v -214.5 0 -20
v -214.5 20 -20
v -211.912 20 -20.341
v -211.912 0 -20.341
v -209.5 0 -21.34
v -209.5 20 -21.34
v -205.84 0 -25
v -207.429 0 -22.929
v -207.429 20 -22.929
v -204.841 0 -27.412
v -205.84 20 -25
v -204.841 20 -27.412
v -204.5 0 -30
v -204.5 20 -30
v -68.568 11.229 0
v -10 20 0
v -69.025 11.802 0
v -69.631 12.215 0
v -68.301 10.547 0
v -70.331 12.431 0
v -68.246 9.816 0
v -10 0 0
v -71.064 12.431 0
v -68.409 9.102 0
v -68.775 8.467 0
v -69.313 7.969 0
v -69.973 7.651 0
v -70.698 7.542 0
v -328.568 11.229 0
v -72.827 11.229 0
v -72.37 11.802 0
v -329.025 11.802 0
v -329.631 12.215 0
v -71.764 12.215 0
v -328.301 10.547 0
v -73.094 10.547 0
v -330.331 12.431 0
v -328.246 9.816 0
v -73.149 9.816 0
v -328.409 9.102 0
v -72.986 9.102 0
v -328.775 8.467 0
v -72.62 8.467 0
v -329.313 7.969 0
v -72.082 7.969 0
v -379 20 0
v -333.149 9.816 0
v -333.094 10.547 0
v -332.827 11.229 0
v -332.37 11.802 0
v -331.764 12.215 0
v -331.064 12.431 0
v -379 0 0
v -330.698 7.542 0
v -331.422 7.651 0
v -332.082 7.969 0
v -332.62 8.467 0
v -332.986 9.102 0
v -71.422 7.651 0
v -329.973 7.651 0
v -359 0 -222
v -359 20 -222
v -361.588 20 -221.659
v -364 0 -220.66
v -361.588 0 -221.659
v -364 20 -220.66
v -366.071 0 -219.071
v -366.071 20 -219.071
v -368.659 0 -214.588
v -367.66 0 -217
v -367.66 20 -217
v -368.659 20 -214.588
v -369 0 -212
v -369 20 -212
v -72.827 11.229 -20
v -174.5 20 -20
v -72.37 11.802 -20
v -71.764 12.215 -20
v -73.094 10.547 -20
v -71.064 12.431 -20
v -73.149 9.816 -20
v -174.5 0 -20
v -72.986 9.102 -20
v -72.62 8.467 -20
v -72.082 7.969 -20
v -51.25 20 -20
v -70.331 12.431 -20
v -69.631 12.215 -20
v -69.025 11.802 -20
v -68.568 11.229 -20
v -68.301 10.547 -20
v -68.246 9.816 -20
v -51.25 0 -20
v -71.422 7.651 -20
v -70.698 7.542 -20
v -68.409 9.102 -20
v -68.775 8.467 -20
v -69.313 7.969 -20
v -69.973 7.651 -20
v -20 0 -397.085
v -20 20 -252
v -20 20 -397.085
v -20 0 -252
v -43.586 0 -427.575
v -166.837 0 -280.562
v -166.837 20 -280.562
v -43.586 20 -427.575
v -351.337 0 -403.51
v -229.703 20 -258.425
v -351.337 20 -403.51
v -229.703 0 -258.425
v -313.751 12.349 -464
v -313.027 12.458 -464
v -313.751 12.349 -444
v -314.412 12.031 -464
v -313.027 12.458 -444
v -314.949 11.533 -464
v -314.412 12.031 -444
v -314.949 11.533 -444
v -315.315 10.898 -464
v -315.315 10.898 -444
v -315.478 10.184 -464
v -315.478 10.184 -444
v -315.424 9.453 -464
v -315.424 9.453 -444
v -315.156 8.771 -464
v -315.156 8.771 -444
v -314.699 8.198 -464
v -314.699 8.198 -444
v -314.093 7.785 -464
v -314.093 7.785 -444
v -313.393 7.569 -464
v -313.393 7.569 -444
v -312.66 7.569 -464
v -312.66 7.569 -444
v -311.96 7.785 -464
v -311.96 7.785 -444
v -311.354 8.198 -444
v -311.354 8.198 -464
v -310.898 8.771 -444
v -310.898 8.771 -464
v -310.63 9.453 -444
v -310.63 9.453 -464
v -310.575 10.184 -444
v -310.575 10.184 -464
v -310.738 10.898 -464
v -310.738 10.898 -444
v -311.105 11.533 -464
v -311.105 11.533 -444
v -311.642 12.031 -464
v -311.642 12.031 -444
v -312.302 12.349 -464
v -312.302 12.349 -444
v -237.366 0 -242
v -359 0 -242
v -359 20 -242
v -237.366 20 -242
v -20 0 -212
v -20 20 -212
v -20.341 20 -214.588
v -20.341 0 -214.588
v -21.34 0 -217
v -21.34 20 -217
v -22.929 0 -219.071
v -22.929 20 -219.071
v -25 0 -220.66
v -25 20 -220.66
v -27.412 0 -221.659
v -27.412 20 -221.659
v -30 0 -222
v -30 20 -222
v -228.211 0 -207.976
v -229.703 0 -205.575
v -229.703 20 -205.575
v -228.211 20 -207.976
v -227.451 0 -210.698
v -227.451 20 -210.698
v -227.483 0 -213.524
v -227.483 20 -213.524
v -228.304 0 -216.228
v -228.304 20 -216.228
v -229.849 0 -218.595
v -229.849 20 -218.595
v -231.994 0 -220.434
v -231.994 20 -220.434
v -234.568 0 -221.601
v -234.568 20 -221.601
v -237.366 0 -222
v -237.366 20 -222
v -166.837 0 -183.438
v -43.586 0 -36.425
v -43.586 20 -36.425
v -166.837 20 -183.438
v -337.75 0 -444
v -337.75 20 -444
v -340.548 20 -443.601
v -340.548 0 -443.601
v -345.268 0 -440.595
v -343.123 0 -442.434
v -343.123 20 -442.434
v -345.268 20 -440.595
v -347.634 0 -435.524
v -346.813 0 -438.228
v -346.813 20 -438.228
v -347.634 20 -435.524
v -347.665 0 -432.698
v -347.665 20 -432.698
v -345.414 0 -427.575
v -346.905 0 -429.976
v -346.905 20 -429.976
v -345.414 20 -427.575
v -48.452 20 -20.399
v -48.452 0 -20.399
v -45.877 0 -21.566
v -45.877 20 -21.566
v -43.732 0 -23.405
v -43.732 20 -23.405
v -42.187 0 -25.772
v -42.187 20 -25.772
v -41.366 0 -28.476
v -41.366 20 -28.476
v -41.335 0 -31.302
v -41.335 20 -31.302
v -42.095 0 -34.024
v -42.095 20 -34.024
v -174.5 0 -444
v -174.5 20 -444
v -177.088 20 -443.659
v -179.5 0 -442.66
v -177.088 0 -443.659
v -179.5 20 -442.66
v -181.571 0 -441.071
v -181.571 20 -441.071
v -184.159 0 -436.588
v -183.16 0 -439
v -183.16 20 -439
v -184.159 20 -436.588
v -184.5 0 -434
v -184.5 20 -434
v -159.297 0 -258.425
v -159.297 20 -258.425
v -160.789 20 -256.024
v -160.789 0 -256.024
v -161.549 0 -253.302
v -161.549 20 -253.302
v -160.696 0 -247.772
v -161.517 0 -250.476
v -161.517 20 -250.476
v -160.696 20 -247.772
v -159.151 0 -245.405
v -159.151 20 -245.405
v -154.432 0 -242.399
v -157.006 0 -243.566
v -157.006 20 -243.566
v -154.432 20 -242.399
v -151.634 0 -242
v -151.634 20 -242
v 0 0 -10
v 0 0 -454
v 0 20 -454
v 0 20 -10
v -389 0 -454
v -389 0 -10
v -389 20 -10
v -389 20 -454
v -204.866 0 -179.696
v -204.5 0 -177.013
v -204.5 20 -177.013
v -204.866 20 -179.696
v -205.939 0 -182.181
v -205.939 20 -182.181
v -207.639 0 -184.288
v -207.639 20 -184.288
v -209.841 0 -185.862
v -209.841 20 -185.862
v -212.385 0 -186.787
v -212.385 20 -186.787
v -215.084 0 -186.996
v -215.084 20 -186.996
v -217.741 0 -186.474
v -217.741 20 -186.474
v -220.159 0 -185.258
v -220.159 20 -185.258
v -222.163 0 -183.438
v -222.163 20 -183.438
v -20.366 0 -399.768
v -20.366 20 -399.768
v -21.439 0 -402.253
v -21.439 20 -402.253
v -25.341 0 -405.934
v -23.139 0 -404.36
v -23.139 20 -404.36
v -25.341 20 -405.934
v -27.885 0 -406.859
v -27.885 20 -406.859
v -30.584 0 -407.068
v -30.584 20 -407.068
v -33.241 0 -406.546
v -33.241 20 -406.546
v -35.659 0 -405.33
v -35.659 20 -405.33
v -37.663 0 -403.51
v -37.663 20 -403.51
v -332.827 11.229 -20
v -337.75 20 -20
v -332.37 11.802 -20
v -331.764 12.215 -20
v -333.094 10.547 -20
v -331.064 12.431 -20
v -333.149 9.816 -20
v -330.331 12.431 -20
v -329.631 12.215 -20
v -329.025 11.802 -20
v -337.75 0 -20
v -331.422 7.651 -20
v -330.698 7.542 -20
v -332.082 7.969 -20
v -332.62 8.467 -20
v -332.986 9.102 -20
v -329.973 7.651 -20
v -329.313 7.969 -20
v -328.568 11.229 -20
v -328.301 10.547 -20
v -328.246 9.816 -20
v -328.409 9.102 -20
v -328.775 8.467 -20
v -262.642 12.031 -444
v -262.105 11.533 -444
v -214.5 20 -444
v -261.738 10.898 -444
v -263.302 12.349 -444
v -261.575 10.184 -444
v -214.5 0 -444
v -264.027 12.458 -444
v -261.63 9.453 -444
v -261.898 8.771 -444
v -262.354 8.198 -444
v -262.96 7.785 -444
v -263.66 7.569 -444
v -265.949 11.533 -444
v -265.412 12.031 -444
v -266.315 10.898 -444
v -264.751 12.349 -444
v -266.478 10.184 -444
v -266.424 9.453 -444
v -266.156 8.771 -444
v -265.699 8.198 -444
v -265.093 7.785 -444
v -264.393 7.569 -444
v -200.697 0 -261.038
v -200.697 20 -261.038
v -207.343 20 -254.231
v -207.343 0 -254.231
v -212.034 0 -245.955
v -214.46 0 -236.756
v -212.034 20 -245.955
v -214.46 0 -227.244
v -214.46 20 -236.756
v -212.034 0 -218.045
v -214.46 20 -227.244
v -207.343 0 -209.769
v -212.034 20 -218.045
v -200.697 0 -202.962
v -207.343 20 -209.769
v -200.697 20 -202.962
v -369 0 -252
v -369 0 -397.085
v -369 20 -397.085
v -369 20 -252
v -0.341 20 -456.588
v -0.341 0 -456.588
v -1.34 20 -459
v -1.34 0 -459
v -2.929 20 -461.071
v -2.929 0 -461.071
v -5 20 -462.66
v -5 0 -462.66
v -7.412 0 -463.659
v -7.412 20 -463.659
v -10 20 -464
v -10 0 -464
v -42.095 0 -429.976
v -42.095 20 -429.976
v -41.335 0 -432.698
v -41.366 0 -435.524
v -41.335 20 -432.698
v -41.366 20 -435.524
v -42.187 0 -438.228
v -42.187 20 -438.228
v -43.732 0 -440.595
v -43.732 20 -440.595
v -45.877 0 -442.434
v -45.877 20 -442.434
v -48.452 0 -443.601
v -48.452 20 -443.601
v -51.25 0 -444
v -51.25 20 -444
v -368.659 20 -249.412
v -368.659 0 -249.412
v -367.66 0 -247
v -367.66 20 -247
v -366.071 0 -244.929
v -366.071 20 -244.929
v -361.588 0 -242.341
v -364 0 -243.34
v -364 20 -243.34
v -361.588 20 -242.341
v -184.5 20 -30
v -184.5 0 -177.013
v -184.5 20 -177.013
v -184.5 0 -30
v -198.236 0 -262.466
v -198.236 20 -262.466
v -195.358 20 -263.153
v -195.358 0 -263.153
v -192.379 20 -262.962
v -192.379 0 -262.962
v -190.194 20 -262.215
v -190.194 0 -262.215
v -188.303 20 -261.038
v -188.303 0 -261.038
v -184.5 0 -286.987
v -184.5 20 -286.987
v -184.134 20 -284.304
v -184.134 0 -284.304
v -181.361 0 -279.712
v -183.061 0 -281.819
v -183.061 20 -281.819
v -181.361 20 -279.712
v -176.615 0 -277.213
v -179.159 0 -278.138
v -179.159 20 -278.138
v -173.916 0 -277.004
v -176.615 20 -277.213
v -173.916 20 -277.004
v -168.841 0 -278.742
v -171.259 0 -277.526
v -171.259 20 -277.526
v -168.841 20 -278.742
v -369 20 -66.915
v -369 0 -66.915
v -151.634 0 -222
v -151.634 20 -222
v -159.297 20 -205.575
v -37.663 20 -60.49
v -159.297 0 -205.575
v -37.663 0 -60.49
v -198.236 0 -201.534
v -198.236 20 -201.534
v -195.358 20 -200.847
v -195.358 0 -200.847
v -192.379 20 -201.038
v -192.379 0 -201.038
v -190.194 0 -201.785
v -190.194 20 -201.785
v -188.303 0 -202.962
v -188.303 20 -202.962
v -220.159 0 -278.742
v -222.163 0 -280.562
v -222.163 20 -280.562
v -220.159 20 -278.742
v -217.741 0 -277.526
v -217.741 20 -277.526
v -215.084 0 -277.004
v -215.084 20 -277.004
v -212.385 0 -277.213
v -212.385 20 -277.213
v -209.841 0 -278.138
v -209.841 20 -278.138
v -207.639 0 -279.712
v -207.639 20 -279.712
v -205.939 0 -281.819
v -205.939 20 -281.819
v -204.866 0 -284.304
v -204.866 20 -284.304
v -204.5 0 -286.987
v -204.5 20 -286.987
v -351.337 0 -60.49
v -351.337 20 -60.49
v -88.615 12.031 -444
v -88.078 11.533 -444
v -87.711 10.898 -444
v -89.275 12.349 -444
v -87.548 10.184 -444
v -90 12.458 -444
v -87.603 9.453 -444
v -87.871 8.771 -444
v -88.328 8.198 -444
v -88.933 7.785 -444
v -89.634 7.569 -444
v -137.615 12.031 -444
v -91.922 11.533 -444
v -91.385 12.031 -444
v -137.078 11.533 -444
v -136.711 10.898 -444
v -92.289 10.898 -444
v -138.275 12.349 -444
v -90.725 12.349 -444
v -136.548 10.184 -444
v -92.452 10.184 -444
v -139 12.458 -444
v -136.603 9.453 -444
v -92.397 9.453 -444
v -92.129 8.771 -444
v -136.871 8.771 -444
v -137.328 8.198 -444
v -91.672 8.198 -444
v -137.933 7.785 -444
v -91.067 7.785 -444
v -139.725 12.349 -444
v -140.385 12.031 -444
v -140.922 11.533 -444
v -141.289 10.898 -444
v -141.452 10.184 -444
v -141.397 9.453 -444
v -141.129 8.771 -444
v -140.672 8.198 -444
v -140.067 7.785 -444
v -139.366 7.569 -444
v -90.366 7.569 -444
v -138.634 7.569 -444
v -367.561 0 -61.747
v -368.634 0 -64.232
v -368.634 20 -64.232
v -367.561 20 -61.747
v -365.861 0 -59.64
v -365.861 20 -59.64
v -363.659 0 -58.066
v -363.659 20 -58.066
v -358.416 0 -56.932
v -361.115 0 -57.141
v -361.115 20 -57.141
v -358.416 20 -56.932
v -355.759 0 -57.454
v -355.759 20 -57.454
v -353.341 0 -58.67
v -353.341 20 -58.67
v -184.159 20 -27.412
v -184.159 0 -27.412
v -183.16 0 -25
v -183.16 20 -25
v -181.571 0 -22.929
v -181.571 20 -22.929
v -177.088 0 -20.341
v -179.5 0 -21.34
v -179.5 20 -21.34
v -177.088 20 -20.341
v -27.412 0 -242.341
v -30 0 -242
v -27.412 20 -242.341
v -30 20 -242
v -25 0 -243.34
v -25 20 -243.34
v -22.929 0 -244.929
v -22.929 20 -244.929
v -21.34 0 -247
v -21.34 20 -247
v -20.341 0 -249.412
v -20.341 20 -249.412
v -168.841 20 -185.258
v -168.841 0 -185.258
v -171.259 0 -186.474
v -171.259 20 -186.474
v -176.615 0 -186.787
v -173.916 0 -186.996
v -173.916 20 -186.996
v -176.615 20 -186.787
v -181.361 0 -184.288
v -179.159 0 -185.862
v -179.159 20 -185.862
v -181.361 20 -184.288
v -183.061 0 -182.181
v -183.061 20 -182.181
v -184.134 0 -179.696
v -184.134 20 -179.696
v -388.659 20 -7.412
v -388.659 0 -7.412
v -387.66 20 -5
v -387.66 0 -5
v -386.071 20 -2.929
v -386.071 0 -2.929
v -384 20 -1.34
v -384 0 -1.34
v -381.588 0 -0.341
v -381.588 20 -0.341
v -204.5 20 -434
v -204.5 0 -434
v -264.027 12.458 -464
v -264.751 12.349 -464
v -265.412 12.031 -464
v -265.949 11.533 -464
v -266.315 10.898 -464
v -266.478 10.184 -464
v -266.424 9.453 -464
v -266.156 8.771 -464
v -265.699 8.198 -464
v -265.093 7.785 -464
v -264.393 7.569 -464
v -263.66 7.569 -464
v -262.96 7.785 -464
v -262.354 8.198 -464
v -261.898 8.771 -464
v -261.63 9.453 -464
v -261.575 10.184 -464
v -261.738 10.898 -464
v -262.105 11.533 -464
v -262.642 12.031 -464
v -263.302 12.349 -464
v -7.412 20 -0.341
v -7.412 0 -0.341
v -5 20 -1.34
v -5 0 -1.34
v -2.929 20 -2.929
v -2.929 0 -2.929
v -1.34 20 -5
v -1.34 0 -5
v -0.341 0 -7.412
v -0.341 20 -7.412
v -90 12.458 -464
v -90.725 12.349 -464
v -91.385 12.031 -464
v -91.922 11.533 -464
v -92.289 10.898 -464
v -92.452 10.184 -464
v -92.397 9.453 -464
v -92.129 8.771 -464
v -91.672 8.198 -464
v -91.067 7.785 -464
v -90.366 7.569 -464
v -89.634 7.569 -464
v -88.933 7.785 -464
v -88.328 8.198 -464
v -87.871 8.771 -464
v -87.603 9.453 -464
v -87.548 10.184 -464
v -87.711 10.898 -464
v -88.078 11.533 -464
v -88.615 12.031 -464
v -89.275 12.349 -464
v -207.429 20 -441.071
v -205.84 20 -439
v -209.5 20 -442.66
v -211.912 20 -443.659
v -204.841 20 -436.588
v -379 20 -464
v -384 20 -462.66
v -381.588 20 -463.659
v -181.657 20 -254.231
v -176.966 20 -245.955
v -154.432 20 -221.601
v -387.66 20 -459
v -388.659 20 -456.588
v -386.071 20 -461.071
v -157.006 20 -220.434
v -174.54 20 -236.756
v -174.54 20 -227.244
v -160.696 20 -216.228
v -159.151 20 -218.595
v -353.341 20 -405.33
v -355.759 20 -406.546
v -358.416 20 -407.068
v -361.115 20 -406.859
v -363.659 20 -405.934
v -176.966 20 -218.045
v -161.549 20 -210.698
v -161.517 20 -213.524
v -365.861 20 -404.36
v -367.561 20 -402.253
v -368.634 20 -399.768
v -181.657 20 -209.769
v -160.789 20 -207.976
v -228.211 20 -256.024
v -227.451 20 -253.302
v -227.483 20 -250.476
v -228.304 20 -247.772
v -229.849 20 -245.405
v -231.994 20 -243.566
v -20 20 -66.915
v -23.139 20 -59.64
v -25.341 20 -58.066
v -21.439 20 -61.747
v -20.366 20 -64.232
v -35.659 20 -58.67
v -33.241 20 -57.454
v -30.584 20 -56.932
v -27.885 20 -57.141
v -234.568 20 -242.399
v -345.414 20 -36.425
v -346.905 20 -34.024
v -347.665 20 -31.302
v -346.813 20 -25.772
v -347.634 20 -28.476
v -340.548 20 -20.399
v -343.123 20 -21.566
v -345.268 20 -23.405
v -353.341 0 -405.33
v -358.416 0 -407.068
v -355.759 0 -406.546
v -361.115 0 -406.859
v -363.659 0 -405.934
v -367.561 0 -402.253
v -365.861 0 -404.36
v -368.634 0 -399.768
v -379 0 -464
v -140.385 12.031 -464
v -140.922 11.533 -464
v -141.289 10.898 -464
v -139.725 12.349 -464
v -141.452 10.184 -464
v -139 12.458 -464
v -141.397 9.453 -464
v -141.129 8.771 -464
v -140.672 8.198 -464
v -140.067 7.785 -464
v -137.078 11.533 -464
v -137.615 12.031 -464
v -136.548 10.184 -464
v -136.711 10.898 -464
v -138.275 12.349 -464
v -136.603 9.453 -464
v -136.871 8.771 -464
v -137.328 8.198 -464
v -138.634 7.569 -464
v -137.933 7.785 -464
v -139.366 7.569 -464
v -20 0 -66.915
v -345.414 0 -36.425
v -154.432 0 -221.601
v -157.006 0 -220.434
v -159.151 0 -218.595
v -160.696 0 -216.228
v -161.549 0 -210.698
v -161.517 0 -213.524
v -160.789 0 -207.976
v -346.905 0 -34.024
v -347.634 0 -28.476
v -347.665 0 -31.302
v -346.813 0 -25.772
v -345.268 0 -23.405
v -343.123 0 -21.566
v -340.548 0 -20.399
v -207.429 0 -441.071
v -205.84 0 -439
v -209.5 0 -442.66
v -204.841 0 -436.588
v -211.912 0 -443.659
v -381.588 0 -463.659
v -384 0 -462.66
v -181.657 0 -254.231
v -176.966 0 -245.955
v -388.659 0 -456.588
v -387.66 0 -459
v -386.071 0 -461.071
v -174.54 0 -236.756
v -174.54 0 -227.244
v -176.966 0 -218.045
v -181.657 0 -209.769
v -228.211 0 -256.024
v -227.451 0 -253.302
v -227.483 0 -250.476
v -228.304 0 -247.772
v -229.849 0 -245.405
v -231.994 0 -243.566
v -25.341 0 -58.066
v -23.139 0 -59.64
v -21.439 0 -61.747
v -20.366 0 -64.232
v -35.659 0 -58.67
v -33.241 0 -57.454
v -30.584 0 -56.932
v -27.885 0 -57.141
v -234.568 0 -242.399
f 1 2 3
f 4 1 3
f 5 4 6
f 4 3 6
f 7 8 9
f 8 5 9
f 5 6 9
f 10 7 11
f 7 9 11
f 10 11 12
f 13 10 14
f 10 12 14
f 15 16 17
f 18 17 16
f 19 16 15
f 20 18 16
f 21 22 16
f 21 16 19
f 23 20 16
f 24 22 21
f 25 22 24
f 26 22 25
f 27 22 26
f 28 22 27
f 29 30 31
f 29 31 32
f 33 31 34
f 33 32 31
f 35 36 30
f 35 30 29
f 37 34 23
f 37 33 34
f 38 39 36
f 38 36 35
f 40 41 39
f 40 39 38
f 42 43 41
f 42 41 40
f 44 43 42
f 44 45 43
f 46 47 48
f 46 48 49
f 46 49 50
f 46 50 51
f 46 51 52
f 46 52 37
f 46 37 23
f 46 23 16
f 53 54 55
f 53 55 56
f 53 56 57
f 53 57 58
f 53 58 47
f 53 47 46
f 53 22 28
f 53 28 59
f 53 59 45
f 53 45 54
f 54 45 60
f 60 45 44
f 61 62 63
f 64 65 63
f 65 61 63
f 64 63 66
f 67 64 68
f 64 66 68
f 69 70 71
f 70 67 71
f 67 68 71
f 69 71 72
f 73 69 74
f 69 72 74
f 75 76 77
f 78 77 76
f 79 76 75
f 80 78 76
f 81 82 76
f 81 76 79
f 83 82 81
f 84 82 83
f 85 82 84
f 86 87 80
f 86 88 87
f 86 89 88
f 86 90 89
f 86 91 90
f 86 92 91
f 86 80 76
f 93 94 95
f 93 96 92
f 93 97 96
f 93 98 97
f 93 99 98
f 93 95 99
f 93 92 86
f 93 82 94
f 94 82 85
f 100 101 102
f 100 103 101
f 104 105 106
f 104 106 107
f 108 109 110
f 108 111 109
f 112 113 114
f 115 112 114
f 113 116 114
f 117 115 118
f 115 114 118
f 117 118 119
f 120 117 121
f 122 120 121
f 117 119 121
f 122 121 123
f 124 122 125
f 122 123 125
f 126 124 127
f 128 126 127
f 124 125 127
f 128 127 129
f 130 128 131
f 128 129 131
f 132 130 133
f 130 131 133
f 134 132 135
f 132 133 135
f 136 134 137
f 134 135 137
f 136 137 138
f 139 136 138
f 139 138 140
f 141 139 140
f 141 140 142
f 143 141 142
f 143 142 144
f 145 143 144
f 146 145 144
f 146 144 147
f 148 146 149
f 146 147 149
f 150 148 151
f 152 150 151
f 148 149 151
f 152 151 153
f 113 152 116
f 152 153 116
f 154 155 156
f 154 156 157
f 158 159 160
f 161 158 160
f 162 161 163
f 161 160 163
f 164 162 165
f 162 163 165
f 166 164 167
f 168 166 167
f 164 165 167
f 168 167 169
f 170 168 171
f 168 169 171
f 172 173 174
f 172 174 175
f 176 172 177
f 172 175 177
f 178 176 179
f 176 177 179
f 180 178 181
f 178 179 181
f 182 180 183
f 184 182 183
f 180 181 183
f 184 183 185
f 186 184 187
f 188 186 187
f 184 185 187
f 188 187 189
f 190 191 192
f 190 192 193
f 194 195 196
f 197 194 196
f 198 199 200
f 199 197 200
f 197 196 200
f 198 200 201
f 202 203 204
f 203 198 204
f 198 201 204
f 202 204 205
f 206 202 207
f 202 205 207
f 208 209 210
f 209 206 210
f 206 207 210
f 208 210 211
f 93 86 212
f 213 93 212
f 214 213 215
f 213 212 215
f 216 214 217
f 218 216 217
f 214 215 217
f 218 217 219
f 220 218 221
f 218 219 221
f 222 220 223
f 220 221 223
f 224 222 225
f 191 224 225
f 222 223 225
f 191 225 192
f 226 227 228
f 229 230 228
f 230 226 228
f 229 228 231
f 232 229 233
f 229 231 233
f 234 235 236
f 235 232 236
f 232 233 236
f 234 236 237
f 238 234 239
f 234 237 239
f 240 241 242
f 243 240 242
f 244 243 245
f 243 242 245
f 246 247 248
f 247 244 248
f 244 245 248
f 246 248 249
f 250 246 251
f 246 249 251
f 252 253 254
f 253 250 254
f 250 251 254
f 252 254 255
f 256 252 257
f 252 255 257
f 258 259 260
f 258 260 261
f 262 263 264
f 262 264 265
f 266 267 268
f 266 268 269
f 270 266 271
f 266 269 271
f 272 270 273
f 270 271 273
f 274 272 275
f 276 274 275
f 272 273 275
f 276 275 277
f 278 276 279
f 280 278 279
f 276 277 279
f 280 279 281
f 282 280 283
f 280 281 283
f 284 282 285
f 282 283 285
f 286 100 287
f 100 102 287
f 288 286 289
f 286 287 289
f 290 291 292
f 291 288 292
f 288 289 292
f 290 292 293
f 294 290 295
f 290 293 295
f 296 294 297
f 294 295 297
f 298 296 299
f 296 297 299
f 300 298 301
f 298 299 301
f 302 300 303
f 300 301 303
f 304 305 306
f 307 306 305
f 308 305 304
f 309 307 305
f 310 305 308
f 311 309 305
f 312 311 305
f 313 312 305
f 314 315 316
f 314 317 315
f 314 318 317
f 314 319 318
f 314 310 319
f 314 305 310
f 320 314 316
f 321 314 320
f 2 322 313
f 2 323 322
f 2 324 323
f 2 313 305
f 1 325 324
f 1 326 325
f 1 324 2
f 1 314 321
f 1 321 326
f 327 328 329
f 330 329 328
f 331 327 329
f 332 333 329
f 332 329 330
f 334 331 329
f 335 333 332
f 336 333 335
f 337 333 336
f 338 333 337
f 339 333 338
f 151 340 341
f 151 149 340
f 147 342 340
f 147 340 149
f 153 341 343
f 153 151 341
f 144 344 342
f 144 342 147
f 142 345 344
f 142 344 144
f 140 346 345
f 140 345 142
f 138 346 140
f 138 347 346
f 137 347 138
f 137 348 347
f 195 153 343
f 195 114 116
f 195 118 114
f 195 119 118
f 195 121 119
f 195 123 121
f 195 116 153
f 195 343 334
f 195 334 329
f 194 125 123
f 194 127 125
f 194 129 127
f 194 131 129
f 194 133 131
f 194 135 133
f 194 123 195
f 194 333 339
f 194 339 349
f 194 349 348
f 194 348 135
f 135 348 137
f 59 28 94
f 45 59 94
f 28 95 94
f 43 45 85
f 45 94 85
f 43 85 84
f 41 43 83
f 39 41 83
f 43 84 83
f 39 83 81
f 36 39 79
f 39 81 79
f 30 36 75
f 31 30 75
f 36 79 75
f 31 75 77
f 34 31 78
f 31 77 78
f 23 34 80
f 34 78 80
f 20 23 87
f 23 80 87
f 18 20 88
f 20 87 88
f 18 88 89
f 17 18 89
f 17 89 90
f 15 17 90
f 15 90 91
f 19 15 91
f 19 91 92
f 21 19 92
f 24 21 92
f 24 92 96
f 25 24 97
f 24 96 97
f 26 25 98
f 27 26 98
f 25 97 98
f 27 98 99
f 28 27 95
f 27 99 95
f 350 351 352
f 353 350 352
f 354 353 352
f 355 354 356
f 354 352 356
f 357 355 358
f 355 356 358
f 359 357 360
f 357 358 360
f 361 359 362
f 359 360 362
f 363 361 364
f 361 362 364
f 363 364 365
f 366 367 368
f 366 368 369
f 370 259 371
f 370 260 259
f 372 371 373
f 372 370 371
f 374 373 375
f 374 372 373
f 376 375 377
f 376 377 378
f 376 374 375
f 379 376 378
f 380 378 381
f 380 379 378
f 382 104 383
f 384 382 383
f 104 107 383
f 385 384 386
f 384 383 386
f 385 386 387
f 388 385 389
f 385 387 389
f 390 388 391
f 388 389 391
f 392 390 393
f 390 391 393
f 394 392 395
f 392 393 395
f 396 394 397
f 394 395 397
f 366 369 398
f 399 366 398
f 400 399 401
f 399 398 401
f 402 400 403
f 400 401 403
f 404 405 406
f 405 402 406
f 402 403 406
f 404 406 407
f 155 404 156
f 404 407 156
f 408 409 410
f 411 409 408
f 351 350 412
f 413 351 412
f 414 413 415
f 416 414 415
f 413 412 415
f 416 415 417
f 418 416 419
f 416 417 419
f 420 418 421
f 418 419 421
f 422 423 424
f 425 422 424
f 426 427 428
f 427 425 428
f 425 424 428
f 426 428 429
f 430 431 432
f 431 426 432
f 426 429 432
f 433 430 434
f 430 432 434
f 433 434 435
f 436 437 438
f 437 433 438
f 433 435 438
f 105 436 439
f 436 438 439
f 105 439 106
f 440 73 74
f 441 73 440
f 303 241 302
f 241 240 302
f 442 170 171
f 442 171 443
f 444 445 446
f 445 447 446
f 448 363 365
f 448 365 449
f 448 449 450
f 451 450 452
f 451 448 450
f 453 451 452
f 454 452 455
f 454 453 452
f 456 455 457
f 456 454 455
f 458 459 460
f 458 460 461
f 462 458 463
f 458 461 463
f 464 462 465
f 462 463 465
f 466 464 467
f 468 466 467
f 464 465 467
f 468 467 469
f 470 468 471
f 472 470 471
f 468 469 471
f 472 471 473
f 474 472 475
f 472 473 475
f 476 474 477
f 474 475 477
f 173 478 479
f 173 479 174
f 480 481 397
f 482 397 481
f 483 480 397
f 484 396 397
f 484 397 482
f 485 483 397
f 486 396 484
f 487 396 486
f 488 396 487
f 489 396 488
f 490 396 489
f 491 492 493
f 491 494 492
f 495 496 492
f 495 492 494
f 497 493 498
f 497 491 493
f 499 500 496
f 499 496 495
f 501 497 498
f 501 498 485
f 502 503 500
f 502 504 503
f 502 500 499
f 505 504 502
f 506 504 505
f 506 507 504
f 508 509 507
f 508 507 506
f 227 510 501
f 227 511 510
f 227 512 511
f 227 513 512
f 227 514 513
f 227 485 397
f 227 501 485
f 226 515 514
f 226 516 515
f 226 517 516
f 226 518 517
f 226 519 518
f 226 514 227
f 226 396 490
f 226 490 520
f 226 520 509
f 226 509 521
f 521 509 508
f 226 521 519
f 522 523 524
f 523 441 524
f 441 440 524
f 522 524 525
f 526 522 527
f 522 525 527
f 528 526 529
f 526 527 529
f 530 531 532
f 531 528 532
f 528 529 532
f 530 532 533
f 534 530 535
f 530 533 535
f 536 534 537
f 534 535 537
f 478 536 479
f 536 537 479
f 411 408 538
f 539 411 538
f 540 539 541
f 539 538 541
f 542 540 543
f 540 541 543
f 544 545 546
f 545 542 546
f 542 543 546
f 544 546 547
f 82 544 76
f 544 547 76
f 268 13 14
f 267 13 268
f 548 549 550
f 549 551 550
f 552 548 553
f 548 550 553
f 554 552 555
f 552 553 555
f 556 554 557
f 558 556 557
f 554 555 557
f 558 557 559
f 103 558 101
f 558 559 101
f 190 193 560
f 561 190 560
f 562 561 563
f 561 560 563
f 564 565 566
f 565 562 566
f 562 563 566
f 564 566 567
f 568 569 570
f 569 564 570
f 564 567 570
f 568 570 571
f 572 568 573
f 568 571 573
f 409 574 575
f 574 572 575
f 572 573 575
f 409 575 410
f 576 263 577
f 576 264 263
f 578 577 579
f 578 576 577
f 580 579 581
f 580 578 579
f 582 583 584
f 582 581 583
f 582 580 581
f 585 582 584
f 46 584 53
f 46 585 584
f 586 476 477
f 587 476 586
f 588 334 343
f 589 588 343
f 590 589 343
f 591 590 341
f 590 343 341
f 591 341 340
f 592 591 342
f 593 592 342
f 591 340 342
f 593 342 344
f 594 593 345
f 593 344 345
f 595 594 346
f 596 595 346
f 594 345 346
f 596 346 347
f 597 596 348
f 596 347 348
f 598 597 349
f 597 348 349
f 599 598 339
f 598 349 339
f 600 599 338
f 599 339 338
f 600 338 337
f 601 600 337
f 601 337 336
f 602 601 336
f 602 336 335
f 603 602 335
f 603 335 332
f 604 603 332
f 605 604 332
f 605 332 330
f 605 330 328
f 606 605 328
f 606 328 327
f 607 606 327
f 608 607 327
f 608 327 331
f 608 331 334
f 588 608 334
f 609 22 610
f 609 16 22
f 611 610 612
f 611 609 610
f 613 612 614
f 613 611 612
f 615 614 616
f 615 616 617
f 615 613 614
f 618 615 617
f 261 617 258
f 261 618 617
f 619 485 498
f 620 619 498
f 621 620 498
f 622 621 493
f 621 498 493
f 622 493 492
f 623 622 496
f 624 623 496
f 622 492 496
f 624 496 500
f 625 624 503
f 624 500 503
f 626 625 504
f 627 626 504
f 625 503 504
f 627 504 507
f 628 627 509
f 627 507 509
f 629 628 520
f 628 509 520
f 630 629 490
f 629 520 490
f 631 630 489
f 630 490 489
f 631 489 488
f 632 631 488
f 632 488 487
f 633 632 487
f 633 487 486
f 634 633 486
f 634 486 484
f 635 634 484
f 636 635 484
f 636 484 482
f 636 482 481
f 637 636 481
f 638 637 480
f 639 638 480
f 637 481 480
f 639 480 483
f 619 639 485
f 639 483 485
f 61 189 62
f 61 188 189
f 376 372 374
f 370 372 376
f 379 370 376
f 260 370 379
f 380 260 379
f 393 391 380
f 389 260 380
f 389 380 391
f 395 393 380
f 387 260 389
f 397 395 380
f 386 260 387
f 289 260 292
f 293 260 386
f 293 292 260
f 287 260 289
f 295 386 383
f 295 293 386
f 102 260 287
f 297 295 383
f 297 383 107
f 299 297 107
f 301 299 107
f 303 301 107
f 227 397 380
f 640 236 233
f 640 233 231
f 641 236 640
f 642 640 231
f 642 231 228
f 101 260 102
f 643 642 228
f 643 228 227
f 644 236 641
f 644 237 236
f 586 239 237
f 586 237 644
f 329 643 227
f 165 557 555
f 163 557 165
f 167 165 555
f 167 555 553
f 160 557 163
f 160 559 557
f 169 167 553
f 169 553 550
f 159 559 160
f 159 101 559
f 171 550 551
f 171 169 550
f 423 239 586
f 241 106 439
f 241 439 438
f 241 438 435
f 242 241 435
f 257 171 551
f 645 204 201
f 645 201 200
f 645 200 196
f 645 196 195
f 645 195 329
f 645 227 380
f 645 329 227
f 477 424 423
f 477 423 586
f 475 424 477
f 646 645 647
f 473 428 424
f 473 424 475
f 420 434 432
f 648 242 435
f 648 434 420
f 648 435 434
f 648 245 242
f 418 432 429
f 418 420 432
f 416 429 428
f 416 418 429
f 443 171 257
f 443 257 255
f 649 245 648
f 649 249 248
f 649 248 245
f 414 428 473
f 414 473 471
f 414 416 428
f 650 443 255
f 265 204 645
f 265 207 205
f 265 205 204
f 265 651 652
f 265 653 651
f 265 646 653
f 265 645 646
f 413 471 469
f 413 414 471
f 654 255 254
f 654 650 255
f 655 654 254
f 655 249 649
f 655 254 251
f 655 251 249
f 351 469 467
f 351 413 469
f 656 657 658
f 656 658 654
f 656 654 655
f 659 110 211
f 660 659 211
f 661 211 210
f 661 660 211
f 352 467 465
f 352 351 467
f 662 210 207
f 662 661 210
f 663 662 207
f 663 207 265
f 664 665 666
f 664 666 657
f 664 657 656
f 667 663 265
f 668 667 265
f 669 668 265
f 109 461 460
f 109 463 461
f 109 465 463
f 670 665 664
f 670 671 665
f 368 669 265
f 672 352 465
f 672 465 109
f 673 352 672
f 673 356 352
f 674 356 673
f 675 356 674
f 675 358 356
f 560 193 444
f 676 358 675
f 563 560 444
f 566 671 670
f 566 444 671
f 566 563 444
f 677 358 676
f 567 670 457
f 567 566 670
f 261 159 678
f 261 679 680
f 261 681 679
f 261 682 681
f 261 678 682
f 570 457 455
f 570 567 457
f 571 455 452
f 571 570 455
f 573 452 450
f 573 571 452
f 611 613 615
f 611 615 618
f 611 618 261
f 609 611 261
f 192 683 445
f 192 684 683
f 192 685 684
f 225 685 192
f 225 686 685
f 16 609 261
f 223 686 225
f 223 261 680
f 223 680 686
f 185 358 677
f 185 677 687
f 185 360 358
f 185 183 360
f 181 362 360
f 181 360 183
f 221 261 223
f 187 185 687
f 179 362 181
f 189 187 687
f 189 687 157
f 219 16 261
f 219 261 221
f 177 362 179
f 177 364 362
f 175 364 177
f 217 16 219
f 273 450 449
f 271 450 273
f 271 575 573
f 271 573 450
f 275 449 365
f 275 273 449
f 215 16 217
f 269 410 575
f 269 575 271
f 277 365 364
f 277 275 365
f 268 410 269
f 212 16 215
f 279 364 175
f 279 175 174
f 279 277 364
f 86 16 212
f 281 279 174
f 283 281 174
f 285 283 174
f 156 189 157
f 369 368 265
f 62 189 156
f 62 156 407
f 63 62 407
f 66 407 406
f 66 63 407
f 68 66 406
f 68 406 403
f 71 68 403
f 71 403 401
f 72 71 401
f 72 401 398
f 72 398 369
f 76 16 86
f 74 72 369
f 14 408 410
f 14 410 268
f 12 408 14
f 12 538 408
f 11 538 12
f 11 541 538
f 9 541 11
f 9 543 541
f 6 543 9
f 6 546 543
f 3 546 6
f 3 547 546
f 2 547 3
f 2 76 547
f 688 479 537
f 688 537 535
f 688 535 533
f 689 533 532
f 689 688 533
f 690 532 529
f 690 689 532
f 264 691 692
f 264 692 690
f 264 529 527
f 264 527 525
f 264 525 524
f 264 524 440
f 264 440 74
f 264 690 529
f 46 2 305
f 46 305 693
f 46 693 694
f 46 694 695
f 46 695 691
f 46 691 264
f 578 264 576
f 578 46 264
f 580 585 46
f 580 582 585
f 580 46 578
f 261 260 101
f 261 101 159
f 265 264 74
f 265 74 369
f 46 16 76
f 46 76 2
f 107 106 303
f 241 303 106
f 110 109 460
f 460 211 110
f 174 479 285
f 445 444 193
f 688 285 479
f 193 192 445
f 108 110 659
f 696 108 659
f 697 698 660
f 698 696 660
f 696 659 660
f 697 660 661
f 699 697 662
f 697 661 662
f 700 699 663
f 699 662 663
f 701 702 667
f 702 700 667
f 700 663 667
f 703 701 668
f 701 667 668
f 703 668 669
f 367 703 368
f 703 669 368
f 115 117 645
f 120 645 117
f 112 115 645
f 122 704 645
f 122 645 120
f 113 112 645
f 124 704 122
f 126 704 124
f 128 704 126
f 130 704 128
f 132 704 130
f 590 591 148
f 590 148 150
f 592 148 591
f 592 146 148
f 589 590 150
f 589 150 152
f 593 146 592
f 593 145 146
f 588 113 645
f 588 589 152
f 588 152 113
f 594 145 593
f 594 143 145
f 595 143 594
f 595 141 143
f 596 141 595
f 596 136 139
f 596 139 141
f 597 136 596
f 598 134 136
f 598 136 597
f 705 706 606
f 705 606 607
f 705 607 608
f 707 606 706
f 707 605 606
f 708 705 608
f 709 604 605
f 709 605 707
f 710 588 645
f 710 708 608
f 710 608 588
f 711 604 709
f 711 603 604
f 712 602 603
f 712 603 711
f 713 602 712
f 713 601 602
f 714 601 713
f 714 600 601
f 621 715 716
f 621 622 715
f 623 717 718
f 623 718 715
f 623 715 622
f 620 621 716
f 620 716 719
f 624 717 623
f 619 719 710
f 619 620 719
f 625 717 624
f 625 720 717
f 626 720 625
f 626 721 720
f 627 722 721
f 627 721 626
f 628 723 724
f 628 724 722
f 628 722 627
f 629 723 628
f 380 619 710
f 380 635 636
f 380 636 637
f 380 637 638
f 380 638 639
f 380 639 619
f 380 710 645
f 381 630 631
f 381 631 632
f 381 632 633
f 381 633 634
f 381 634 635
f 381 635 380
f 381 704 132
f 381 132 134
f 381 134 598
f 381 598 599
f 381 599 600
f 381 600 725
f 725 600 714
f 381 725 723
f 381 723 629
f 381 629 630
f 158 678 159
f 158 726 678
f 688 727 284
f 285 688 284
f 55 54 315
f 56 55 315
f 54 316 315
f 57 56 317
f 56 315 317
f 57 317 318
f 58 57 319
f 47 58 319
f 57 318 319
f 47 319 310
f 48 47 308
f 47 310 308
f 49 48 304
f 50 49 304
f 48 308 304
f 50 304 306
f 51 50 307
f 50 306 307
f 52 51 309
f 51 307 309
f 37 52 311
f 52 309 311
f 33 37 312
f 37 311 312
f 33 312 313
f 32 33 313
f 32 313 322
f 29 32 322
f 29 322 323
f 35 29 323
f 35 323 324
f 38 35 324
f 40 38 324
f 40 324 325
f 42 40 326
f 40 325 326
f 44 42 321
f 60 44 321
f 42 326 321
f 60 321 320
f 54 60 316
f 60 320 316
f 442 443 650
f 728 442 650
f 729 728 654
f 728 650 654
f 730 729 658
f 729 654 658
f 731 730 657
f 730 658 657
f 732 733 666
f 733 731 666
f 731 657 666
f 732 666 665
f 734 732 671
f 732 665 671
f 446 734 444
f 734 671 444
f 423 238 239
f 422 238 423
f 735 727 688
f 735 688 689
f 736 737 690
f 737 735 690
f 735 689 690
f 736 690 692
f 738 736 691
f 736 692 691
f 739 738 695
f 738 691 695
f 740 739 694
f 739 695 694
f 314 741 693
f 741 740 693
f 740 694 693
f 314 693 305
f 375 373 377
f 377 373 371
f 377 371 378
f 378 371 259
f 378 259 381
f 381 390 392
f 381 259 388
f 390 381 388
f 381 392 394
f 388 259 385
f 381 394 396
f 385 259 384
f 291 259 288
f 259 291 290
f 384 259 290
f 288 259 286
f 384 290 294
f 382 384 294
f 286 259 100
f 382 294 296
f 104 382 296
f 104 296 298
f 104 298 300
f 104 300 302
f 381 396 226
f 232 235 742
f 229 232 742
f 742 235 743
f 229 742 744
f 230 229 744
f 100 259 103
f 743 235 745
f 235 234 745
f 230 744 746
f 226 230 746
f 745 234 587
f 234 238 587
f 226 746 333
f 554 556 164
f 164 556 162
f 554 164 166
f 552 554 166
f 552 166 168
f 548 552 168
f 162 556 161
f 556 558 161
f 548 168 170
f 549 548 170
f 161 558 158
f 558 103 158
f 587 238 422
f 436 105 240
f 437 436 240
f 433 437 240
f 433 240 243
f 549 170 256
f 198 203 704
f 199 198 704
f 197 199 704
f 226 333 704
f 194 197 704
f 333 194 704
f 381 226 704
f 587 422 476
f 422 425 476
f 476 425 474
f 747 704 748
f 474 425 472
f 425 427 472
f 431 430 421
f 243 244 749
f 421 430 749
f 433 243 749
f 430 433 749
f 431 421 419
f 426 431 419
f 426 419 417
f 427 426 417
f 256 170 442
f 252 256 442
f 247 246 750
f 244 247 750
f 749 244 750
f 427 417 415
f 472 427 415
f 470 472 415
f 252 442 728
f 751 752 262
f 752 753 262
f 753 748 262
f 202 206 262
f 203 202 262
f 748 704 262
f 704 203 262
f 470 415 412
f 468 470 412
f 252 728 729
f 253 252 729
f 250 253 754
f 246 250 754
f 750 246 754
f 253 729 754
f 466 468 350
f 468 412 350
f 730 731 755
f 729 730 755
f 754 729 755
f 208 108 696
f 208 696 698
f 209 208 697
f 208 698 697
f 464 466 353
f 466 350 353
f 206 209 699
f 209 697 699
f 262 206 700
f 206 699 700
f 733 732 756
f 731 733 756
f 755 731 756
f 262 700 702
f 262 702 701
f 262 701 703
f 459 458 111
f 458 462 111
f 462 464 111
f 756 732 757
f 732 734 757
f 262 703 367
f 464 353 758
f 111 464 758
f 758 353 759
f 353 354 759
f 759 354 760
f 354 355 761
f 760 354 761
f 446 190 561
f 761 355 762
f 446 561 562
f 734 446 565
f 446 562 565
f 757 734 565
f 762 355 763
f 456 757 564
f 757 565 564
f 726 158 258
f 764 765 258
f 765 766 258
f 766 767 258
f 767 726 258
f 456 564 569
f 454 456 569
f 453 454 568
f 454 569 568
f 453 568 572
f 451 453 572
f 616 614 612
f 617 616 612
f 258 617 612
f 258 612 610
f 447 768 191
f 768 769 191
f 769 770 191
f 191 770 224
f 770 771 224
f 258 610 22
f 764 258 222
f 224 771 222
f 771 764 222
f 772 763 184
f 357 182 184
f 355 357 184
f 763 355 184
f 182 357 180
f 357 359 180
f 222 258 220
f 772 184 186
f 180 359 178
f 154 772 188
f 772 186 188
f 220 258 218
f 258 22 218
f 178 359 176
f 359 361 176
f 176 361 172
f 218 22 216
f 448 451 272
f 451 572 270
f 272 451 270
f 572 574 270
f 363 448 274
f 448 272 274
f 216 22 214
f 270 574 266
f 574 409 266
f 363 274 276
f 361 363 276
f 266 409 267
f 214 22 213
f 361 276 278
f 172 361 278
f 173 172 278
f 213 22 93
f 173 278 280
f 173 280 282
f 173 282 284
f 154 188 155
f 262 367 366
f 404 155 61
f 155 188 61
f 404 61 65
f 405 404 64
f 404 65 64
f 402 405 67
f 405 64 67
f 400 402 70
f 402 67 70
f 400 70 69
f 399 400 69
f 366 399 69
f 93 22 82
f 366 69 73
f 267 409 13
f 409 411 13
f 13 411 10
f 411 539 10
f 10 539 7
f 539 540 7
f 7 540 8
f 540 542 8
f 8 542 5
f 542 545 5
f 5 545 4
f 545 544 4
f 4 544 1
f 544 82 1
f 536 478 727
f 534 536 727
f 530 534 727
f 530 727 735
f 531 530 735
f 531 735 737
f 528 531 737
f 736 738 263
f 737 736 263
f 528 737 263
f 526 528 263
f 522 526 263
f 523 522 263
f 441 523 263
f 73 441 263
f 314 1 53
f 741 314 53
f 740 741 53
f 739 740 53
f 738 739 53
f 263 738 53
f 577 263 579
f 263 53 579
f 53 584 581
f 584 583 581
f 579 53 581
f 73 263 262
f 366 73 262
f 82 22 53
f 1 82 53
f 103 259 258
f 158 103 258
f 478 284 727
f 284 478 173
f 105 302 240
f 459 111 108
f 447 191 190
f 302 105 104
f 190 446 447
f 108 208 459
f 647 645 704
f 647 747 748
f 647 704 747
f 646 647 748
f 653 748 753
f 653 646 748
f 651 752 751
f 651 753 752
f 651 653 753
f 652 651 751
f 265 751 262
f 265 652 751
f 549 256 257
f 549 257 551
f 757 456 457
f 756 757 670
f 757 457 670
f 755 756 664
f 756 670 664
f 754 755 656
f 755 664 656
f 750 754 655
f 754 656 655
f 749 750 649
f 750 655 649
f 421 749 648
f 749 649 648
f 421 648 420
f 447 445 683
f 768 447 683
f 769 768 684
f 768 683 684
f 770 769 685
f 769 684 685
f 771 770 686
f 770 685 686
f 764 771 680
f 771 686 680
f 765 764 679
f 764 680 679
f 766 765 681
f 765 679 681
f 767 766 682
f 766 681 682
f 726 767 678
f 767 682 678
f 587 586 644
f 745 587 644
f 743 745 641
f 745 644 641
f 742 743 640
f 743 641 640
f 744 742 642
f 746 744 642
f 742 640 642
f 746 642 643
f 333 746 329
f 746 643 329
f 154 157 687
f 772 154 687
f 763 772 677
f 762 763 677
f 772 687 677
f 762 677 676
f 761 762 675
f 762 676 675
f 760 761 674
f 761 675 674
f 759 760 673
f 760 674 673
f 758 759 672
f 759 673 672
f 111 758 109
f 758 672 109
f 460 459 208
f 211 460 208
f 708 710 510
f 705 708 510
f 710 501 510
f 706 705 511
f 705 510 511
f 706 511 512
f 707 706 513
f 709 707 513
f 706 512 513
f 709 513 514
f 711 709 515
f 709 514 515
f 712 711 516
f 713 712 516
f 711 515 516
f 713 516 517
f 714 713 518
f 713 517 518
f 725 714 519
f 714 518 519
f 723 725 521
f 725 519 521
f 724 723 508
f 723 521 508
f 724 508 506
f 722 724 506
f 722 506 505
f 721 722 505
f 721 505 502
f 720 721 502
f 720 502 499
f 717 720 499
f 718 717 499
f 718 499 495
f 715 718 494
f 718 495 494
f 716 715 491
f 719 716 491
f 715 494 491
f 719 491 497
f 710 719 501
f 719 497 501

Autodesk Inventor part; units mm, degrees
ref_plane "YZ Plane" through (0, 0, 0) normal (1, 0, 0) x (0, 1, 0)
ref_plane "XZ Plane" through (0, 0, 0) normal (0, 1, 0) x (-1, 0, 0)
ref_plane "XY Plane" through (0, 0, 0) normal (0, 0, 1) x (1, 0, 0)
sketch "Sketch1" plane through (0, 0, 0) normal (0, 1, 0) x (-1, 0, 0)
  line L0 (0, 0) -> (389, 0)
  line L1 (389, 0) -> (389, -464)
  line L2 (389, -464) -> (0, -464)
  line L3 (0, -464) -> (0, 0)
  line L4 (369, -444) -> (369, -20)
  line L5 (369, -20) -> (20, -20)
  line L6 (20, -20) -> (20, -444)
  line L7 (20, -444) -> (369, -444)
  line L8 (184.5, 0) -> (204.5, 0)
  line L9 (204.5, 0) -> (204.5, -464)
  line L10 (204.5, -464) -> (184.5, -464)
  line L11 (184.5, -464) -> (184.5, 0)
  line L12 (0, -222) -> (389, -222)
  line L13 (389, -222) -> (389, -242)
  line L14 (389, -242) -> (0, -242)
  line L15 (0, -242) -> (0, -222)
  line L16 (396.6632, -6.4246) -> (7.6632, -470.4246)
  line L17 (381.3368, 6.4246) -> (-7.6632, -457.5754)
  line L18 (7.6632, 6.4246) -> (396.6632, -457.5754)
  line L19 (-7.6632, -6.4246) -> (381.3368, -470.4246)
  point P0 (369, -222)
  point P1 (215.933, -222)
  point P2 (369, -39.4213)
  point P3 (369, -242)
  point P4 (369, -424.5787)
  point P5 (215.933, -242)
  point P6 (184.5, -20)
  point P7 (184.5, -204.5067)
  point P8 (29.8166, -20)
  point P9 (20, -424.5787)
  point P10 (20, -242)
  point P11 (173.067, -242)
  point P12 (204.5, -259.4933)
  point P13 (359.1834, -444)
  point P14 (204.5, -444)
  point P15 (20, -39.4213)
  point P16 (173.067, -222)
  point P17 (20, -222)
  point P18 (359.1834, -20)
  point P19 (204.5, -204.5067)
  point P20 (204.5, -20)
  point P21 (184.5, -444)
  point P22 (29.8166, -444)
  point P23 (184.5, -259.4933)
  dimension "d0" = 389
  dimension "d1" = 464
  dimension "d2" = 20
  dimension "d3" = 20
  dimension "d4" = 20
extrude "Extrusion1" add sketch "Sketch1" along normal blind 20 contours L11 L5 L18 L0 | L0 L9 L5 L11 | L0 L17 L5 L9 | L18 L5 L6 L19 L3 L0 | L5 L9 L17 L18 L11 | L0 L1 L16 L4 L5 L17 | L18 L11 L12 L19 L6 L5 | L18 L17 L12 L11 | L5 L4 L16 L12 L9 L17 | L9 L12 L18 L17 | L19 L6 L12 L3 | L12 L17 L11 | L11 L17 L19 L12 | L18 L12 L17 | L1 L12 L4 L16 | L12 L16 L18 L9 | L9 L18 L12 | L12 L6 L14 L3 | L17 L12 L18 L9 L16 L14 L19 L11 | L11 L19 L17 | L19 L17 L14 L6 L12 | L1 L14 L4 L12 | L18 L16 L9 | L12 L4 L14 L18 L16 | L14 L6 L17 L3 | L19 L14 L11 | L11 L14 L17 L19 | L1 L18 L4 L14 | L16 L18 L14 L9 | L9 L14 L16 | L17 L6 L7 L16 L2 L3 | L14 L19 L16 L11 | L11 L16 L7 L6 L17 L14 | L14 L16 L19 | L1 L2 L19 L7 L4 L18 | L14 L18 L4 L7 L19 L9 | L9 L19 L16 L14 | L16 L19 L9 L7 L11 | L16 L7 L11 L2 | L7 L9 L2 L11 | L2 L9 L7 L19
fillet "Fillet1" radius 10 28 edges at (-389, 10, 0) (0, 10, 0) (0, 10, -464) (-389, 10, -464) (-369, 10, -424.5787) (-359.1834, 10, -444) (-369, 10, -242) (-369, 10, -222) (-204.5, 10, -444) (-204.5, 10, -259.4933) (-215.933, 10, -242) (-215.933, 10, -222) (-204.5, 10, -204.5067) (-184.5, 10, -204.5067) (-173.067, 10, -222) (-173.067, 10, -242) (-184.5, 10, -259.4933) (-369, 10, -39.4213) (-359.1834, 10, -20) (-204.5, 10, -20) (-184.5, 10, -20) (-29.8166, 10, -20) (-20, 10, -39.4213) (-20, 10, -222) (-20, 10, -242) (-20, 10, -424.5787) (-29.8166, 10, -444) (-184.5, 10, -444)
sketch "Sketch2" plane through (0, 20, 0) normal (0, 1, 0) x (1, 0, 0)
  line L0 (-389, 454) -> (-389, 10) projected
  line L1 (-389, 232) -> (0, 232)
  line L2 (0, 10) -> (0, 454) projected
  line L3 (-379, 0) -> (-10, 0) projected
  line L4 (-194.5, 0) -> (-194.5, 464)
  line L5 (-10, 464) -> (-379, 464) projected
  arc A0 (-194.5, 265) -> (-194.5, 199) centre (-177.7668, 232) ccw
  arc A1 (-194.5, 199) -> (-194.5, 265) centre (-211.2332, 232) ccw
  point P0 (0, 0)
  dimension "d12" = 66
  dimension "d13" = 37
  dimension "d14" = 37
extrude "Extrusion2" cut sketch "Sketch2" against normal through all
fillet "Fillet2" radius 10 2 edges at (-194.5, 10, -265) (-194.5, 10, -199)
sketch "Sketch6" plane through (-10, 0, -464) normal (0, 0, -1) x (-1, 0, 0)
  line L0 (369, 20) -> (369, 0) projected
  line L1 (0, 20) -> (369, 20) projected
  line L2 (0, 0) -> (0, 20) projected
  line L3 (0, 0) -> (369, 0) projected
  line L4 (0, 10) -> (80, 10)
  line L5 (0, 10) -> (80, 10) construction
  line L6 (80, 10) -> (129, 10)
  line L7 (369, 10) -> (303.0267, 10)
  line L8 (369, 10) -> (434.9733, 10) construction
  line L9 (303.0267, 10) -> (254.0267, 10)
  dimension "d48" = 80
  dimension "d49" = 0
  dimension "d50" = 49
  dimension "d51" = 180
  dimension "d52" = 180
  dimension "d53" = 49
  dimension "d54" = 180
hole "Hole2" at (-90, 10, -464) at (-139, 10, -464) at (-264.0267, 10, -464) at (-313.0267, 10, -464) direction (0, 0, 1) diameter 4.917 depth 20 thread size "M6x1" class "6H" standard "ISO Metric profile"
sketch "Sketch8" plane through (-379, 0, 0) normal (0, 0, 1) x (1, 0, 0)
  line L0 (379, 0) -> (379, 20) projected
  line L1 (369, 20) -> (369, 0) projected
  line L2 (0, 20) -> (369, 20) projected
  line L3 (0, 0) -> (0, 20) projected
  line L4 (0, 0) -> (369, 0) projected
  line L5 (0, 10) -> (369, 10)
  line L6 (178.3025, 0) -> (178.3025, 20) projected
  line L7 (178.3025, 10) -> (308.3025, 10)
  line L8 (308.3025, 10) -> (48.3025, 10)
  dimension "d46" = 130
  dimension "d47" = 260
hole "Hole3" at (-330.6975, 10, 0) at (-70.6975, 10, 0) direction (0, 0, -1) diameter 4.917 depth 20 thread size "M6x1" class "6H" standard "ISO Metric profile"
properties part number "Halterung_Aufbau"
